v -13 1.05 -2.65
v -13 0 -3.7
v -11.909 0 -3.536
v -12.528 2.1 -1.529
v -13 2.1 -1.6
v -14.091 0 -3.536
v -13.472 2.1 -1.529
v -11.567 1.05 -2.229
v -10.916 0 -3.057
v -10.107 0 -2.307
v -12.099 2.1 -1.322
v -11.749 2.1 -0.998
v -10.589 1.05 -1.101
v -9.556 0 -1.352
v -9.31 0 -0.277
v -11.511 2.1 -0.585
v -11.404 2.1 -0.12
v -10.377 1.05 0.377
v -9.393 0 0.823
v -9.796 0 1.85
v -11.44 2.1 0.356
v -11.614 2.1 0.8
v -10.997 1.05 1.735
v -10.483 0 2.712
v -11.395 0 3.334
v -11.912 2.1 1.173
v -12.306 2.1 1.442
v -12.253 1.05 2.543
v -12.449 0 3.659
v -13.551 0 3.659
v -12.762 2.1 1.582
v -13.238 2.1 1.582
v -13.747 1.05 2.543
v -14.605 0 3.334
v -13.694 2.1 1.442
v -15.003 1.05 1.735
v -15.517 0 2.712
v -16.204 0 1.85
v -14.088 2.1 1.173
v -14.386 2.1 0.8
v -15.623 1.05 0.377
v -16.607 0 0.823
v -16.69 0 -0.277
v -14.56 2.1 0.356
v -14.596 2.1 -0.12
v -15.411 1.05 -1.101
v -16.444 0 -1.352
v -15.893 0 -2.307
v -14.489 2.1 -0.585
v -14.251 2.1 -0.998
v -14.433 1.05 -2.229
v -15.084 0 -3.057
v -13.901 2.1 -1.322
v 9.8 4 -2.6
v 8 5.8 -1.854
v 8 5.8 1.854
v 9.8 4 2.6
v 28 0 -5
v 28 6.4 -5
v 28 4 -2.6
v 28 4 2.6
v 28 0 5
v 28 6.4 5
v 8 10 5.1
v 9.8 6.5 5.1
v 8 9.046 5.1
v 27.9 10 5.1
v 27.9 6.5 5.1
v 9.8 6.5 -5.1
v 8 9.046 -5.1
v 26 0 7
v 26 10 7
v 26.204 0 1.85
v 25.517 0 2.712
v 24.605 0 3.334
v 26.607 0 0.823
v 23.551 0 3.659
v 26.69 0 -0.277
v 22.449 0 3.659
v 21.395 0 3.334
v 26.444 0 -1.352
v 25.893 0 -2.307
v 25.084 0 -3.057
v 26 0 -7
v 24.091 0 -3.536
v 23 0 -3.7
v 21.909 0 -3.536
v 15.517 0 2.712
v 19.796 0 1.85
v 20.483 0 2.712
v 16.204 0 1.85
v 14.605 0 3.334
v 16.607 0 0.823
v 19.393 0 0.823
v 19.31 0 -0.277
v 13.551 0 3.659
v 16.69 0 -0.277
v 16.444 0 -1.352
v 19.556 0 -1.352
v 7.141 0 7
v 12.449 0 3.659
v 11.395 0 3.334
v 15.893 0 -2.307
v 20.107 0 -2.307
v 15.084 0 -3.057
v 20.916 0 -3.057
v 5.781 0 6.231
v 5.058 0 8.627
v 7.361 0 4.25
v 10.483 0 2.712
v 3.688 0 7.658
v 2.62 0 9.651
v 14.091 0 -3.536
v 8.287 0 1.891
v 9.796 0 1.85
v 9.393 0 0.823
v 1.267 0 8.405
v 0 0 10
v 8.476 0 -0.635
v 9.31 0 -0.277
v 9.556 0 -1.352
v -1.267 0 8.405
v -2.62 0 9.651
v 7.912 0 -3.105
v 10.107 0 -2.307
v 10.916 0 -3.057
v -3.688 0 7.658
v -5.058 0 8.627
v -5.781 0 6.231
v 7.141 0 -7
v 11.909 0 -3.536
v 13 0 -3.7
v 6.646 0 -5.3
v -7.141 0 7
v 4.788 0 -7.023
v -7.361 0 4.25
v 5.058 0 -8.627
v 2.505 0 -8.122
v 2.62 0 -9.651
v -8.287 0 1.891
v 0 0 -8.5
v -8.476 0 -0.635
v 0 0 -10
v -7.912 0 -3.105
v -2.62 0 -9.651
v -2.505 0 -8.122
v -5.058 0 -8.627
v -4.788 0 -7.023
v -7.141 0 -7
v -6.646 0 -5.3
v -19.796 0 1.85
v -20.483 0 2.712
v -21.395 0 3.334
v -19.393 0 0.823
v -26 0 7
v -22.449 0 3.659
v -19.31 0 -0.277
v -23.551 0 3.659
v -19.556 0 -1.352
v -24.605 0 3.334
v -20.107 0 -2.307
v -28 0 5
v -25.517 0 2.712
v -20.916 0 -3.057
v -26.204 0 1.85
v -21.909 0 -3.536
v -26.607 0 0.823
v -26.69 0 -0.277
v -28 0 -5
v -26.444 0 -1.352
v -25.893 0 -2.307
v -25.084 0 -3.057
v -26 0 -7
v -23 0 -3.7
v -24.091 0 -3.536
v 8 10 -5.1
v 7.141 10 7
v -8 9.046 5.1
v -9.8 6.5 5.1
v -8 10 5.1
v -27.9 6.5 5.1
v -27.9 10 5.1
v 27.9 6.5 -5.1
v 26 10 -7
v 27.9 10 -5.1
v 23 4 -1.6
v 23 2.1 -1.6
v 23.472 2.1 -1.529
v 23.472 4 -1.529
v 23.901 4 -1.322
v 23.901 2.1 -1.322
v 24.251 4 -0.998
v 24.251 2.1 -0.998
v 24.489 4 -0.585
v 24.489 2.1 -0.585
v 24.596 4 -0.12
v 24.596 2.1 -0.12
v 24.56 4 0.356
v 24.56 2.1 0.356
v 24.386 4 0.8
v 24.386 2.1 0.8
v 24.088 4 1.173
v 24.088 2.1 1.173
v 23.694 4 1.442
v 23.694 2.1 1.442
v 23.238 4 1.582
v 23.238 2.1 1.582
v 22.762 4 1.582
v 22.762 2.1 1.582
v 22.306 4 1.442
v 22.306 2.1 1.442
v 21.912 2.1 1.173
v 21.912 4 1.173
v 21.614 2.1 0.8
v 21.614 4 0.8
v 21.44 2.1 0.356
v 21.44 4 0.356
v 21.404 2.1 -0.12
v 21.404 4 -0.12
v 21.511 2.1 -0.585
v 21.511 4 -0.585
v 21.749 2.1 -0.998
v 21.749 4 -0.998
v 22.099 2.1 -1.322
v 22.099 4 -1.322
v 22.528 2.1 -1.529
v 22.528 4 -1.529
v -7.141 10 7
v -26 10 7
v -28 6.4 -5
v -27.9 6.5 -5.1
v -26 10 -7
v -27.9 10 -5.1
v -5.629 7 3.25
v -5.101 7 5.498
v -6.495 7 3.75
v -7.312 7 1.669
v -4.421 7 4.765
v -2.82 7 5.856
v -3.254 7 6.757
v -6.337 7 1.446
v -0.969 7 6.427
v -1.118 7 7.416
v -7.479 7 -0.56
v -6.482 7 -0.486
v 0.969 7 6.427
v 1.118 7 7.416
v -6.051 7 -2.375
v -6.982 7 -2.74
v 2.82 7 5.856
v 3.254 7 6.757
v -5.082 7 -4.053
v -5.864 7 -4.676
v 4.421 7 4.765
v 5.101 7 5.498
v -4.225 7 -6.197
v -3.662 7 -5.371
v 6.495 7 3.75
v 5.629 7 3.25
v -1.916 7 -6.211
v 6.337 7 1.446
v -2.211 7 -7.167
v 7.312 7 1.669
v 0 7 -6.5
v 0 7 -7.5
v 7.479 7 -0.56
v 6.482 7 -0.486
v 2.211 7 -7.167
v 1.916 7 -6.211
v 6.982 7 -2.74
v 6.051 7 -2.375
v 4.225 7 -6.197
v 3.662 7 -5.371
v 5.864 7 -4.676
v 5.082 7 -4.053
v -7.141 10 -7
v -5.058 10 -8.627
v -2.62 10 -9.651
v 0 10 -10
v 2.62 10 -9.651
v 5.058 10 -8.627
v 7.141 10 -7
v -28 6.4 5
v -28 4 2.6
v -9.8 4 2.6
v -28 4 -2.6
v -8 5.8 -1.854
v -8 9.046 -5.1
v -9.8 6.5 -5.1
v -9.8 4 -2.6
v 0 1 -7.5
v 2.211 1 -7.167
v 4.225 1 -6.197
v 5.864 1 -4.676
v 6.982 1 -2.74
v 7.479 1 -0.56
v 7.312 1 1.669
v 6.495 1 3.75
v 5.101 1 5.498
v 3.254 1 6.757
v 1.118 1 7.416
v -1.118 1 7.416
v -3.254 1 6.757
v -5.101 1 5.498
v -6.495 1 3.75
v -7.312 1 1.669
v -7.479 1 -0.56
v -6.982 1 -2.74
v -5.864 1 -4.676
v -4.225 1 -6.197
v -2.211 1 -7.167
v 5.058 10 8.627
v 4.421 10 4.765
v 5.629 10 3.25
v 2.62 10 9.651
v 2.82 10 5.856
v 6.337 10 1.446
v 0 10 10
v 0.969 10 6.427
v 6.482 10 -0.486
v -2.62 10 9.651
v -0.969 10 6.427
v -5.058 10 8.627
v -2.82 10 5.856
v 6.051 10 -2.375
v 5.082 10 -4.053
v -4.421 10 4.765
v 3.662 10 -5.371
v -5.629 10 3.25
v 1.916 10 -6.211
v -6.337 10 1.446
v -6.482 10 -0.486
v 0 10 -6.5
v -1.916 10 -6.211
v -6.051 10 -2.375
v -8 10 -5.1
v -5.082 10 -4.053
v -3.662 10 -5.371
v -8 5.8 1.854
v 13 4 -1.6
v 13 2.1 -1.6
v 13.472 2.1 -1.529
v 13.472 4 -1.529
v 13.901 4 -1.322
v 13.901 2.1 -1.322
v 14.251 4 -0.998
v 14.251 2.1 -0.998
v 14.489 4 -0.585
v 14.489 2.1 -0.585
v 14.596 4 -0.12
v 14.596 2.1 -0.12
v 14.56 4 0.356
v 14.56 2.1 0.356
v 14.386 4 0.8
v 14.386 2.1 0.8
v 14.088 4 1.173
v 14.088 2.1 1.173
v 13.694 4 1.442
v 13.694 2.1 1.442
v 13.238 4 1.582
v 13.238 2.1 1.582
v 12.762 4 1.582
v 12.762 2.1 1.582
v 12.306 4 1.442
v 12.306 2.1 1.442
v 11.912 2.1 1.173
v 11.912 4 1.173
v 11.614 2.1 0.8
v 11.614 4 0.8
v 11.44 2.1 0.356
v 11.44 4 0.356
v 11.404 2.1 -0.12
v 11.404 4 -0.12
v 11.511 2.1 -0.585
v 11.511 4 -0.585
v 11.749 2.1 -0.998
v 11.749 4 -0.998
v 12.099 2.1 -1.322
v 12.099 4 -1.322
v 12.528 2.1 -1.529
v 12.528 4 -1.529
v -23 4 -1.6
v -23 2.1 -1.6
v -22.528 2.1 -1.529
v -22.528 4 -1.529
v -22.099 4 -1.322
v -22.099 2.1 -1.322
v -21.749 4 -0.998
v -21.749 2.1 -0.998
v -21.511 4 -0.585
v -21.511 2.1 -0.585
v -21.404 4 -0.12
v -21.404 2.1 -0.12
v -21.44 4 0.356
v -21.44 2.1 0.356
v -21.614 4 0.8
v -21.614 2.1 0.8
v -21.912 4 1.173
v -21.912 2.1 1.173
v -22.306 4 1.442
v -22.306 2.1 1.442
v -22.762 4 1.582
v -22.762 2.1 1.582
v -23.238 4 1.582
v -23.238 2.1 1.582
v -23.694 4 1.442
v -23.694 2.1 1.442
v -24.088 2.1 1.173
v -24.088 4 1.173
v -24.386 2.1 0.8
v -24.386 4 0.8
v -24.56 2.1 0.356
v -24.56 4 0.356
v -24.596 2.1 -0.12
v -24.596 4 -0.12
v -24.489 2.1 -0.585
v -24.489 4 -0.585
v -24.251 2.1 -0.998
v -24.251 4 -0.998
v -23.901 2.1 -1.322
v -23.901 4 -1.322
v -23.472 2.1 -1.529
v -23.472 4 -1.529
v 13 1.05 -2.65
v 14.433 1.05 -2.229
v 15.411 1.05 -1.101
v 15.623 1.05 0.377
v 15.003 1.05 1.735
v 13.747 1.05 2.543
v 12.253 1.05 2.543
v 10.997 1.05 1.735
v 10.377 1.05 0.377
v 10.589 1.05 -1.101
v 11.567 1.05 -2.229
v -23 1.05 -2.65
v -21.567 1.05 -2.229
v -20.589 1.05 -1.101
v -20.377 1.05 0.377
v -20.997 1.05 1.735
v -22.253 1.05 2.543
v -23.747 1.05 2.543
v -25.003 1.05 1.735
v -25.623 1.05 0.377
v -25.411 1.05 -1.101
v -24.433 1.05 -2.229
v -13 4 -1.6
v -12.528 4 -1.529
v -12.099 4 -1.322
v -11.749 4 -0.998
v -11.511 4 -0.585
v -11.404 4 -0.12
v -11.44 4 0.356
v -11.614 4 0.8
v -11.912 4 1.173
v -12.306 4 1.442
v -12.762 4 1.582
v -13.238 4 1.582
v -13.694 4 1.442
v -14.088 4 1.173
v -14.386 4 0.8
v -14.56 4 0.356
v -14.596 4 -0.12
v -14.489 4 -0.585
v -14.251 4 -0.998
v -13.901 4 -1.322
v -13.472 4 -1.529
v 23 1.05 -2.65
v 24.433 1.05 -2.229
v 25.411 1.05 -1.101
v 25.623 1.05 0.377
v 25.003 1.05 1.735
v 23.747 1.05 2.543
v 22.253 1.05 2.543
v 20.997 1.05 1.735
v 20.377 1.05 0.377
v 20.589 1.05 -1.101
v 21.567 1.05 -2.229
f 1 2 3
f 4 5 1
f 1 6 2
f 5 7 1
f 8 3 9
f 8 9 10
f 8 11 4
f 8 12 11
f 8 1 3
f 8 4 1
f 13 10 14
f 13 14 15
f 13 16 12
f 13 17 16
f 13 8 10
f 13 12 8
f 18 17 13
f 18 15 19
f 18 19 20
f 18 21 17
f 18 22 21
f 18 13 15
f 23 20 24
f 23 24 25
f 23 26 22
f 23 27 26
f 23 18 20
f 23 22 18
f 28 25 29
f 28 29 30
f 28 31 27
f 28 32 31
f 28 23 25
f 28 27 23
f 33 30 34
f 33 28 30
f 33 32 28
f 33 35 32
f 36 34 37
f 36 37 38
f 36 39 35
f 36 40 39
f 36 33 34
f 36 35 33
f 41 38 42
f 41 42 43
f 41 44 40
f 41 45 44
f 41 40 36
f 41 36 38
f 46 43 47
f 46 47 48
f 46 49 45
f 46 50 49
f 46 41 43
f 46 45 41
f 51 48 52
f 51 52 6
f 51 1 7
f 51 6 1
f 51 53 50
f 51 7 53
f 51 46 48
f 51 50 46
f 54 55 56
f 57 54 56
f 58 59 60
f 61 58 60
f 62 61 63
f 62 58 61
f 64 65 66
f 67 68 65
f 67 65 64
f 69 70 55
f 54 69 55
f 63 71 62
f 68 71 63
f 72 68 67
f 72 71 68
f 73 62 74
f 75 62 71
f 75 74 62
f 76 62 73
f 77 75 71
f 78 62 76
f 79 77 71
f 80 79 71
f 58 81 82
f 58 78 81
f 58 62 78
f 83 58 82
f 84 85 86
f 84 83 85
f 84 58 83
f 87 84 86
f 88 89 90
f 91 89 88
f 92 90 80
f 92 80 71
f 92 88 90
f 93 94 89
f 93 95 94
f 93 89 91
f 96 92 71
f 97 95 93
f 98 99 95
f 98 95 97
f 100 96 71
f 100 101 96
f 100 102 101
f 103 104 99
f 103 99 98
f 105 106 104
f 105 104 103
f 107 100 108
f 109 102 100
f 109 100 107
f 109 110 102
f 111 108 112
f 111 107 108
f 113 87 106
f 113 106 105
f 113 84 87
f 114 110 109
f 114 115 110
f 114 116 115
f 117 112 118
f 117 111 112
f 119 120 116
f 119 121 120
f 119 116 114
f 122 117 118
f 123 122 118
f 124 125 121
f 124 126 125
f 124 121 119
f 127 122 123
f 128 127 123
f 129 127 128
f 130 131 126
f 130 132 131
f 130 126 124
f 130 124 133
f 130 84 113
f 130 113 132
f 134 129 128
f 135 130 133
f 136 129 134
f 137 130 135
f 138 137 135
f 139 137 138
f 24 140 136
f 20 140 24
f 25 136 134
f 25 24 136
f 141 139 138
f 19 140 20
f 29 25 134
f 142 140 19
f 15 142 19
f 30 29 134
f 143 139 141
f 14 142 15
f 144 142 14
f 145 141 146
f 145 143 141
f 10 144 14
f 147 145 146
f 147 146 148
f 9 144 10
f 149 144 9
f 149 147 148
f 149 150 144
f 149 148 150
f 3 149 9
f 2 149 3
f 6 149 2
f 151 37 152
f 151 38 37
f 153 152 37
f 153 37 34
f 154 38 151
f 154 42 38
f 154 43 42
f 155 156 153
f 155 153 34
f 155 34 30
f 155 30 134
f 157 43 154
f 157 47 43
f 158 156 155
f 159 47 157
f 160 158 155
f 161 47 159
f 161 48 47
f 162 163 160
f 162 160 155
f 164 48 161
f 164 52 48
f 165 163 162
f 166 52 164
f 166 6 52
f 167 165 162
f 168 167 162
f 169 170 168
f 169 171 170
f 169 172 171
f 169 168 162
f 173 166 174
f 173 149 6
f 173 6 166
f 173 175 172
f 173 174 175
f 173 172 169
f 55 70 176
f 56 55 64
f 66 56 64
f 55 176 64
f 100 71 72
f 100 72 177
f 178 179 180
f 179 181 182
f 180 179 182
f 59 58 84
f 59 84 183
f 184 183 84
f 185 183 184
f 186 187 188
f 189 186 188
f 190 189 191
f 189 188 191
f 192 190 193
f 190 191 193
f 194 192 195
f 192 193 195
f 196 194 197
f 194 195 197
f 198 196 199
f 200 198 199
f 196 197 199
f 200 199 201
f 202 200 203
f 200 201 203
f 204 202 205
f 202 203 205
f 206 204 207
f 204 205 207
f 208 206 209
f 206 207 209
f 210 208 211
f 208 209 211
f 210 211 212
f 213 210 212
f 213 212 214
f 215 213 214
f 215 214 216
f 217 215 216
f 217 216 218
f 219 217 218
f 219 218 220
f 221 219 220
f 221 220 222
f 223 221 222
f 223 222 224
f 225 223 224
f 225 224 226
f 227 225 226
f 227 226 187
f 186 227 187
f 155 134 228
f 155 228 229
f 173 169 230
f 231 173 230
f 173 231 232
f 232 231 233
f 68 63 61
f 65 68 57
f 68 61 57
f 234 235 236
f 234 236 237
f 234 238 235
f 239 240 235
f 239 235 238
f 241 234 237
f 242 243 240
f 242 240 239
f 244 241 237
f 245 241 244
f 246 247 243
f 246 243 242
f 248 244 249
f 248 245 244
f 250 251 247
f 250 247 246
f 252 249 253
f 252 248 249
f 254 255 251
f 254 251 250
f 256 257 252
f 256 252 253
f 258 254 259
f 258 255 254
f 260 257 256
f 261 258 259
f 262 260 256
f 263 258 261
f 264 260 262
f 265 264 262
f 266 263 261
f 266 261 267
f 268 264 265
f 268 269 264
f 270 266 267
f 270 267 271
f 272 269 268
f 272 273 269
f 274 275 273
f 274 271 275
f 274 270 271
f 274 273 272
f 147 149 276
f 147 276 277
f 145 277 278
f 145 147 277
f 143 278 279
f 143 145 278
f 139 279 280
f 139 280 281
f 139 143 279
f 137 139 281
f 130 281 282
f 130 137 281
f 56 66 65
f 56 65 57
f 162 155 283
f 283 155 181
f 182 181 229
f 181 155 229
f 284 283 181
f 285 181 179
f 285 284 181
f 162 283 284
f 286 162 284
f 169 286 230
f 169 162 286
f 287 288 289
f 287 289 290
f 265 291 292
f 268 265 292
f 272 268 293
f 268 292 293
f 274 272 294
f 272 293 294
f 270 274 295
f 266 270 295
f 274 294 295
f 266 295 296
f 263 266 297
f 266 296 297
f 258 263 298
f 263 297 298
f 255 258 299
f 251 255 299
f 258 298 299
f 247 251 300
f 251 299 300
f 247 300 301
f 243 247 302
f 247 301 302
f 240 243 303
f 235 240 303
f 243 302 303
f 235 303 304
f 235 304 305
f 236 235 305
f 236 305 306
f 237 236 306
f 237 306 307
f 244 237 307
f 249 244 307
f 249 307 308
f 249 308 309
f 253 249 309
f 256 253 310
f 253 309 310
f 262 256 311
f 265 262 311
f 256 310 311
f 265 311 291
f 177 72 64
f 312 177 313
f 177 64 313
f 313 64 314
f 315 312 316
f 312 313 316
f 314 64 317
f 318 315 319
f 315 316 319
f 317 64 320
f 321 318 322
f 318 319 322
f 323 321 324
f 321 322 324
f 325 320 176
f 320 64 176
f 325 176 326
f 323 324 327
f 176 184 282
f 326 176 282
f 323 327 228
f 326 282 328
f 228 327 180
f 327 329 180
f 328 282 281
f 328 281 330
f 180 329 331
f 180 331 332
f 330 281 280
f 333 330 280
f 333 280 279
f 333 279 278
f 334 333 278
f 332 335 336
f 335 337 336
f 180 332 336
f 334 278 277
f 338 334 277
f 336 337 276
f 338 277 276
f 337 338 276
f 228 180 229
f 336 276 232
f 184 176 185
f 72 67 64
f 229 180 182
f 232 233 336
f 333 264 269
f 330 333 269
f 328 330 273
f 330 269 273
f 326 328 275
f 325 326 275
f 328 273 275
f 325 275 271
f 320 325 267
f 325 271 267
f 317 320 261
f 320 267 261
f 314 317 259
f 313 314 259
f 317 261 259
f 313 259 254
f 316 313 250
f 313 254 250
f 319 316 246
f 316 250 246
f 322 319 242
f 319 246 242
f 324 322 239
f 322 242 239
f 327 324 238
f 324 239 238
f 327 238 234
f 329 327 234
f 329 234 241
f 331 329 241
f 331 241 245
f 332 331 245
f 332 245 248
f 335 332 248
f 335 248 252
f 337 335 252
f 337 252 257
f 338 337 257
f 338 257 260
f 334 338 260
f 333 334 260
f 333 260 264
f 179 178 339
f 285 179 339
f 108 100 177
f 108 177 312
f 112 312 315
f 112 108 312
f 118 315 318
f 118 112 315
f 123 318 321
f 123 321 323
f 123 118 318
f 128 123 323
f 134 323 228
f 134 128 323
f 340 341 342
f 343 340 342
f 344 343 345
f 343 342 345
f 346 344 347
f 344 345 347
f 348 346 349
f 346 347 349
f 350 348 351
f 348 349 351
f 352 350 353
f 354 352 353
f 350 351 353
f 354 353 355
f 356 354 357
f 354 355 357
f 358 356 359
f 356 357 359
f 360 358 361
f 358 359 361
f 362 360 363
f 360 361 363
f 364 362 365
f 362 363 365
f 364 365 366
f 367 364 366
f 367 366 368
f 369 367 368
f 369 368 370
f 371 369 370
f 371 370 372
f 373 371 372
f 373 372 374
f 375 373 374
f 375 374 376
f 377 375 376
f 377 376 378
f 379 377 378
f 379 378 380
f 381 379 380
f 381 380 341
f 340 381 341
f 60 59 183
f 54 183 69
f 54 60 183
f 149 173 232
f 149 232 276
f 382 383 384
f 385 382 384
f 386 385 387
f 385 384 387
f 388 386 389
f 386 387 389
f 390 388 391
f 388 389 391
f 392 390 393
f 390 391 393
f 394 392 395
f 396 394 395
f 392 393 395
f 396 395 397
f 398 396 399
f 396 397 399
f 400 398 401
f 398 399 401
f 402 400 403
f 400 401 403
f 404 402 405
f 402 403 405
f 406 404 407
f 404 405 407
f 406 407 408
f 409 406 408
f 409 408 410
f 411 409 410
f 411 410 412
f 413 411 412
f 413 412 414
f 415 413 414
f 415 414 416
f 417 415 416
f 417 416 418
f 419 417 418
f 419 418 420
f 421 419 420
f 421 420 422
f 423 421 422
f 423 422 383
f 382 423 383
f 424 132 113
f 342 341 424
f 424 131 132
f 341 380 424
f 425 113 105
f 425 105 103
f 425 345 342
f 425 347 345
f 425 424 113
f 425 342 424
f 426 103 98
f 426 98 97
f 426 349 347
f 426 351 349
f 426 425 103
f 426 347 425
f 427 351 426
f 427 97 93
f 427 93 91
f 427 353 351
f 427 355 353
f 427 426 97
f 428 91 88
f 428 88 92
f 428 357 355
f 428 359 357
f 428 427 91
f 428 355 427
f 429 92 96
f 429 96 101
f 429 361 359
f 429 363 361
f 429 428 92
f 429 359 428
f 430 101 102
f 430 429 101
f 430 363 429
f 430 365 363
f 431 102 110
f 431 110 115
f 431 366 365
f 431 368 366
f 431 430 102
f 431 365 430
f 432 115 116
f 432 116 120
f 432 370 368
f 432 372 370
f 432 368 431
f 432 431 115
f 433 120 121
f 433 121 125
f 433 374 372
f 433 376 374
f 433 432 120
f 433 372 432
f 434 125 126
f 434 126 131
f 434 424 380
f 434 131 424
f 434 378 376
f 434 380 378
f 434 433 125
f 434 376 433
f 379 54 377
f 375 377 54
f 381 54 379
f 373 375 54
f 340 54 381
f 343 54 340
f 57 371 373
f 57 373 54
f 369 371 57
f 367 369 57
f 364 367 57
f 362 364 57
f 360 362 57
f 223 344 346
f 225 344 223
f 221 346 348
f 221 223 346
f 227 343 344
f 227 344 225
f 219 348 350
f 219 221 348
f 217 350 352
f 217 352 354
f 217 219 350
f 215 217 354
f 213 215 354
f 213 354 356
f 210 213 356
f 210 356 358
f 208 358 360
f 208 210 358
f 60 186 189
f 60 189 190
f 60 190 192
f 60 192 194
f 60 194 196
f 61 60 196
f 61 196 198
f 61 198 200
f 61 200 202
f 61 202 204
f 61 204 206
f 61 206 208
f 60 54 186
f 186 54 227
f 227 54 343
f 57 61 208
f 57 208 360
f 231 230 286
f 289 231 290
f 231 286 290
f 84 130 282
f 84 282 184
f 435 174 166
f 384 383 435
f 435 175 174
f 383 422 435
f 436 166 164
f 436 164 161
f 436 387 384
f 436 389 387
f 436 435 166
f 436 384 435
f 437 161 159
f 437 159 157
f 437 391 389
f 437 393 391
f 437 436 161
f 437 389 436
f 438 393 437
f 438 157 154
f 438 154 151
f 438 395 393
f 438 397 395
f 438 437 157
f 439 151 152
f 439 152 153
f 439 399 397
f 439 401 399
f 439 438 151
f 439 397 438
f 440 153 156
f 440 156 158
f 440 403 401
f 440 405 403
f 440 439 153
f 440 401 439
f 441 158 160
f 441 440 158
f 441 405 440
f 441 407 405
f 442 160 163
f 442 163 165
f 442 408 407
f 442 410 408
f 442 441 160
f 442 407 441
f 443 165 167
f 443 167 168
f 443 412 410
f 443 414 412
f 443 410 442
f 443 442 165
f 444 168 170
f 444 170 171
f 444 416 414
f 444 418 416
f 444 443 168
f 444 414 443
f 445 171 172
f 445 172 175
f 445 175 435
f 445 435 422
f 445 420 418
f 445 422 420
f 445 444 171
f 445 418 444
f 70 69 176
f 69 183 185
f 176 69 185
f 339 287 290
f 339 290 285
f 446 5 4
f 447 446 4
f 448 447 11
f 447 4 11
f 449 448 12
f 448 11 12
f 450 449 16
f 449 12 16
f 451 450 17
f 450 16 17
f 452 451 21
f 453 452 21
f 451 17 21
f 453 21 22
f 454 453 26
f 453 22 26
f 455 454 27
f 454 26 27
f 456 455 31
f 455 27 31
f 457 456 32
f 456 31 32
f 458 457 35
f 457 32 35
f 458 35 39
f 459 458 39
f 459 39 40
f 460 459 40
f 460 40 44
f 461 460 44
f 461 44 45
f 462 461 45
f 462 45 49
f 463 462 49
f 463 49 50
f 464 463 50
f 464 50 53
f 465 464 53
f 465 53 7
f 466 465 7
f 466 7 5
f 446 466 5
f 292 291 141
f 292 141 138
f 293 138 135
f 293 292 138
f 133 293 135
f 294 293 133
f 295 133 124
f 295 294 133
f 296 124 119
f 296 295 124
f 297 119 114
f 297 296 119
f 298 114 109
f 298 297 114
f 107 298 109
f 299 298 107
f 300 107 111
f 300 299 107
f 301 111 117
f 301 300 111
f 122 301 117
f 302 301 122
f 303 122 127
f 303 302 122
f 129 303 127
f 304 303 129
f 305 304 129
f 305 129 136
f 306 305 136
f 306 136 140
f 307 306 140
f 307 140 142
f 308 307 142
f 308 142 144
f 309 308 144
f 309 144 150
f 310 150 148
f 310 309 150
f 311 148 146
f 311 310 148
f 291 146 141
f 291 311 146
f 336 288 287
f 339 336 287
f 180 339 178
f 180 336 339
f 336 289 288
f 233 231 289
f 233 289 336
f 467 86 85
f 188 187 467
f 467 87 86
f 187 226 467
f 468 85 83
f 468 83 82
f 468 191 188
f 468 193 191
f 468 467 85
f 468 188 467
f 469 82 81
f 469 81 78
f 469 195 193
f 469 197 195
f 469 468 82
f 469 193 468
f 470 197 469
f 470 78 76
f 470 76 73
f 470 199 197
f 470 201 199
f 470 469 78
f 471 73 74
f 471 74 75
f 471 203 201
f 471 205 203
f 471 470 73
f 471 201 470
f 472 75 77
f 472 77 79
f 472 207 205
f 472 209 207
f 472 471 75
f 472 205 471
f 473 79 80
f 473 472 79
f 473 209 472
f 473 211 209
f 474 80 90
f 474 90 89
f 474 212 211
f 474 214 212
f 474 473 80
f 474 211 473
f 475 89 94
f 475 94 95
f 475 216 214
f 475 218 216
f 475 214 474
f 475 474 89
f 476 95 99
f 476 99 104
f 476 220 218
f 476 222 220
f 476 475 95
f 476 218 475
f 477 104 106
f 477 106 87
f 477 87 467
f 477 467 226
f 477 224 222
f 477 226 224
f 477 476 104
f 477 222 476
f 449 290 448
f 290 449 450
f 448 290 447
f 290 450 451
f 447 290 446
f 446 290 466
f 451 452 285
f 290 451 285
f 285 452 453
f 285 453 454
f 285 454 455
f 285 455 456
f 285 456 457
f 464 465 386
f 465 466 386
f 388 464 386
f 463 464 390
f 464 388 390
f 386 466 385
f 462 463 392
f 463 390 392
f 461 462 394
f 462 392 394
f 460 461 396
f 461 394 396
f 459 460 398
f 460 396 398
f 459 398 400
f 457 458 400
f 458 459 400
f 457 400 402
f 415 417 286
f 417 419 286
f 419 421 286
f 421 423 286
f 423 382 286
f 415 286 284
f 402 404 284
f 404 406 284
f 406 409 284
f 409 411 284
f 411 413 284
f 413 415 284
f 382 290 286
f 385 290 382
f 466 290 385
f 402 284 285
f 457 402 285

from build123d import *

# Parameters (mm, degrees)
BOSS_EXTRU_1_DEPTH           = 10
ESQUISSE2_W                  = 10.2
ESQUISSE2_H                  = 6
ENL_V_MAT_EXTRU_1_DEPTH      = 20
CHANFREIN1_SIZE              = 2.5
CHANFREIN2_SIZE              = 1.8
CHANFREIN1_OF_SYM_TRIE1_SIZE = 2.5
CHANFREIN2_OF_SYM_TRIE1_SIZE = 1.8
ESQUISSE3_R                  = 6.5
ENL_V_MAT_EXTRU_2_DEPTH      = 32.368774283
ESQUISSE4_R                  = 7.5
ENL_V_MAT_EXTRU_3_DEPTH      = 7
CHANFREIN3_SIZE              = 1
ESQUISSE5_R                  = 1.6
ENL_V_MAT_EXTRU_4_DEPTH      = 7
CHANFREIN4_SIZE              = 2.1
CHANFREIN5_SIZE              = 2


with BuildPart() as part:
    # Esquisse1 → Boss.-Extru.1 (new body)
    with BuildSketch(Plane(origin=(0, 0, 0), x_dir=(1, 0, 0), z_dir=(0, 1, 0))):
        with BuildLine():
            Line((7.141428429, 7), (28, 7))
            Line((28, 7), (28, -7))
            Line((28, -7), (7.141428429, -7))
            ThreePointArc((7.141428429, -7), (0, -10), (-7.141428429, -7))
            Line((-7.141428429, -7), (-28, -7))
            Line((-28, -7), (-28, 7))
            Line((-28, 7), (-7.141428429, 7))
            ThreePointArc((-7.141428429, 7), (0, 10), (7.141428429, 7))
        make_face()
    extrude(amount=BOSS_EXTRU_1_DEPTH)

    # Esquisse2 → Enlèv. mat.-Extru.1 (cut)
    with BuildSketch(Plane.ZY.offset(28)):
        with Locations((0, 7)):
            Rectangle(ESQUISSE2_W, ESQUISSE2_H)
    enl_v_mat_extru_1 = extrude(amount=-ENL_V_MAT_EXTRU_1_DEPTH, mode=Mode.SUBTRACT)

    # Chanfrein1
    chanfrein1_edges = [part.edges().sort_by_distance(p)[0] for p in [
        (-18, 4, -5.1),
        (-18, 4, 5.1),
    ]]
    chamfer(chanfrein1_edges, length=CHANFREIN1_SIZE)

    # Chanfrein2
    chanfrein2_edges = [part.edges().sort_by_distance(p)[0] for p in [
        (-8, 4, 0),
        (-8, 5.25, -3.85),
        (-8, 5.25, 3.85),
    ]]
    chamfer(chanfrein2_edges, length=CHANFREIN2_SIZE)

    # Symétrie1: Enlèv. mat.-Extru.1 across plane
    add(enl_v_mat_extru_1.mirror(Plane(origin=(0, 0, 0), x_dir=(0, 0, 1), z_dir=(1, 0, 0))), mode=Mode.SUBTRACT)

    # Chanfrein1 of Symétrie1
    chanfrein1_of_sym_trie1_edges = [part.edges().sort_by_distance(p)[0] for p in [
        (18, 4, -5.1),
        (18, 4, 5.1),
    ]]
    chamfer(chanfrein1_of_sym_trie1_edges, length=CHANFREIN1_OF_SYM_TRIE1_SIZE)

    # Chanfrein2 of Symétrie1
    chanfrein2_of_sym_trie1_edges = [part.edges().sort_by_distance(p)[0] for p in [
        (8, 4, 0),
        (8, 5.25, -3.85),
        (8, 5.25, 3.85),
    ]]
    chamfer(chanfrein2_of_sym_trie1_edges, length=CHANFREIN2_OF_SYM_TRIE1_SIZE)

    # Esquisse3 → Enlèv. mat.-Extru.2 (cut, through all)
    with BuildSketch(Plane.XZ):
        with Locations(Location((0, 0, 0), (0, 0, 270))):
            Circle(ESQUISSE3_R)
    extrude(amount=-ENL_V_MAT_EXTRU_2_DEPTH, mode=Mode.SUBTRACT)

    # Esquisse4 → Enlèv. mat.-Extru.3 (cut)
    with BuildSketch(Plane.XZ):
        with Locations(Location((0, 0, 0), (0, 0, 270))):
            Circle(ESQUISSE4_R)
    extrude(amount=-ENL_V_MAT_EXTRU_3_DEPTH, mode=Mode.SUBTRACT)

    # Chanfrein3
    chanfrein3_edges = [part.edges().sort_by_distance(p)[0] for p in [
        (0, 0, 7.5),
    ]]
    chamfer(chanfrein3_edges, length=CHANFREIN3_SIZE)

    # Esquisse5 → Enlèv. mat.-Extru.4 (cut)
    with BuildSketch(Plane.XZ):
        with Locations(Location((-23, 0, 0), (0, 0, 270))):
            Circle(ESQUISSE5_R)
        with Locations(Location((-13, 0, 0), (0, 0, 270))):
            Circle(ESQUISSE5_R)
        with Locations(Location((13, 0, 0), (0, 0, 270))):
            Circle(ESQUISSE5_R)
        with Locations(Location((23, 0, 0), (0, 0, 270))):
            Circle(ESQUISSE5_R)
    extrude(amount=-ENL_V_MAT_EXTRU_4_DEPTH, mode=Mode.SUBTRACT)

    # Chanfrein4
    chanfrein4_edges = [part.edges().sort_by_distance(p)[0] for p in [
        (-23, 0, 1.6),
        (-13, 0, 1.6),
        (13, 0, 1.6),
        (23, 0, 1.6),
    ]]
    chamfer(chanfrein4_edges, length=CHANFREIN4_SIZE)

    # Chanfrein5
    chanfrein5_edges = [part.edges().sort_by_distance(p)[0] for p in [
        (28, 5, -7),
        (28, 5, 7),
        (-28, 5, -7),
        (-28, 5, 7),
    ]]
    chamfer(chanfrein5_edges, length=CHANFREIN5_SIZE)


solid = part.part
